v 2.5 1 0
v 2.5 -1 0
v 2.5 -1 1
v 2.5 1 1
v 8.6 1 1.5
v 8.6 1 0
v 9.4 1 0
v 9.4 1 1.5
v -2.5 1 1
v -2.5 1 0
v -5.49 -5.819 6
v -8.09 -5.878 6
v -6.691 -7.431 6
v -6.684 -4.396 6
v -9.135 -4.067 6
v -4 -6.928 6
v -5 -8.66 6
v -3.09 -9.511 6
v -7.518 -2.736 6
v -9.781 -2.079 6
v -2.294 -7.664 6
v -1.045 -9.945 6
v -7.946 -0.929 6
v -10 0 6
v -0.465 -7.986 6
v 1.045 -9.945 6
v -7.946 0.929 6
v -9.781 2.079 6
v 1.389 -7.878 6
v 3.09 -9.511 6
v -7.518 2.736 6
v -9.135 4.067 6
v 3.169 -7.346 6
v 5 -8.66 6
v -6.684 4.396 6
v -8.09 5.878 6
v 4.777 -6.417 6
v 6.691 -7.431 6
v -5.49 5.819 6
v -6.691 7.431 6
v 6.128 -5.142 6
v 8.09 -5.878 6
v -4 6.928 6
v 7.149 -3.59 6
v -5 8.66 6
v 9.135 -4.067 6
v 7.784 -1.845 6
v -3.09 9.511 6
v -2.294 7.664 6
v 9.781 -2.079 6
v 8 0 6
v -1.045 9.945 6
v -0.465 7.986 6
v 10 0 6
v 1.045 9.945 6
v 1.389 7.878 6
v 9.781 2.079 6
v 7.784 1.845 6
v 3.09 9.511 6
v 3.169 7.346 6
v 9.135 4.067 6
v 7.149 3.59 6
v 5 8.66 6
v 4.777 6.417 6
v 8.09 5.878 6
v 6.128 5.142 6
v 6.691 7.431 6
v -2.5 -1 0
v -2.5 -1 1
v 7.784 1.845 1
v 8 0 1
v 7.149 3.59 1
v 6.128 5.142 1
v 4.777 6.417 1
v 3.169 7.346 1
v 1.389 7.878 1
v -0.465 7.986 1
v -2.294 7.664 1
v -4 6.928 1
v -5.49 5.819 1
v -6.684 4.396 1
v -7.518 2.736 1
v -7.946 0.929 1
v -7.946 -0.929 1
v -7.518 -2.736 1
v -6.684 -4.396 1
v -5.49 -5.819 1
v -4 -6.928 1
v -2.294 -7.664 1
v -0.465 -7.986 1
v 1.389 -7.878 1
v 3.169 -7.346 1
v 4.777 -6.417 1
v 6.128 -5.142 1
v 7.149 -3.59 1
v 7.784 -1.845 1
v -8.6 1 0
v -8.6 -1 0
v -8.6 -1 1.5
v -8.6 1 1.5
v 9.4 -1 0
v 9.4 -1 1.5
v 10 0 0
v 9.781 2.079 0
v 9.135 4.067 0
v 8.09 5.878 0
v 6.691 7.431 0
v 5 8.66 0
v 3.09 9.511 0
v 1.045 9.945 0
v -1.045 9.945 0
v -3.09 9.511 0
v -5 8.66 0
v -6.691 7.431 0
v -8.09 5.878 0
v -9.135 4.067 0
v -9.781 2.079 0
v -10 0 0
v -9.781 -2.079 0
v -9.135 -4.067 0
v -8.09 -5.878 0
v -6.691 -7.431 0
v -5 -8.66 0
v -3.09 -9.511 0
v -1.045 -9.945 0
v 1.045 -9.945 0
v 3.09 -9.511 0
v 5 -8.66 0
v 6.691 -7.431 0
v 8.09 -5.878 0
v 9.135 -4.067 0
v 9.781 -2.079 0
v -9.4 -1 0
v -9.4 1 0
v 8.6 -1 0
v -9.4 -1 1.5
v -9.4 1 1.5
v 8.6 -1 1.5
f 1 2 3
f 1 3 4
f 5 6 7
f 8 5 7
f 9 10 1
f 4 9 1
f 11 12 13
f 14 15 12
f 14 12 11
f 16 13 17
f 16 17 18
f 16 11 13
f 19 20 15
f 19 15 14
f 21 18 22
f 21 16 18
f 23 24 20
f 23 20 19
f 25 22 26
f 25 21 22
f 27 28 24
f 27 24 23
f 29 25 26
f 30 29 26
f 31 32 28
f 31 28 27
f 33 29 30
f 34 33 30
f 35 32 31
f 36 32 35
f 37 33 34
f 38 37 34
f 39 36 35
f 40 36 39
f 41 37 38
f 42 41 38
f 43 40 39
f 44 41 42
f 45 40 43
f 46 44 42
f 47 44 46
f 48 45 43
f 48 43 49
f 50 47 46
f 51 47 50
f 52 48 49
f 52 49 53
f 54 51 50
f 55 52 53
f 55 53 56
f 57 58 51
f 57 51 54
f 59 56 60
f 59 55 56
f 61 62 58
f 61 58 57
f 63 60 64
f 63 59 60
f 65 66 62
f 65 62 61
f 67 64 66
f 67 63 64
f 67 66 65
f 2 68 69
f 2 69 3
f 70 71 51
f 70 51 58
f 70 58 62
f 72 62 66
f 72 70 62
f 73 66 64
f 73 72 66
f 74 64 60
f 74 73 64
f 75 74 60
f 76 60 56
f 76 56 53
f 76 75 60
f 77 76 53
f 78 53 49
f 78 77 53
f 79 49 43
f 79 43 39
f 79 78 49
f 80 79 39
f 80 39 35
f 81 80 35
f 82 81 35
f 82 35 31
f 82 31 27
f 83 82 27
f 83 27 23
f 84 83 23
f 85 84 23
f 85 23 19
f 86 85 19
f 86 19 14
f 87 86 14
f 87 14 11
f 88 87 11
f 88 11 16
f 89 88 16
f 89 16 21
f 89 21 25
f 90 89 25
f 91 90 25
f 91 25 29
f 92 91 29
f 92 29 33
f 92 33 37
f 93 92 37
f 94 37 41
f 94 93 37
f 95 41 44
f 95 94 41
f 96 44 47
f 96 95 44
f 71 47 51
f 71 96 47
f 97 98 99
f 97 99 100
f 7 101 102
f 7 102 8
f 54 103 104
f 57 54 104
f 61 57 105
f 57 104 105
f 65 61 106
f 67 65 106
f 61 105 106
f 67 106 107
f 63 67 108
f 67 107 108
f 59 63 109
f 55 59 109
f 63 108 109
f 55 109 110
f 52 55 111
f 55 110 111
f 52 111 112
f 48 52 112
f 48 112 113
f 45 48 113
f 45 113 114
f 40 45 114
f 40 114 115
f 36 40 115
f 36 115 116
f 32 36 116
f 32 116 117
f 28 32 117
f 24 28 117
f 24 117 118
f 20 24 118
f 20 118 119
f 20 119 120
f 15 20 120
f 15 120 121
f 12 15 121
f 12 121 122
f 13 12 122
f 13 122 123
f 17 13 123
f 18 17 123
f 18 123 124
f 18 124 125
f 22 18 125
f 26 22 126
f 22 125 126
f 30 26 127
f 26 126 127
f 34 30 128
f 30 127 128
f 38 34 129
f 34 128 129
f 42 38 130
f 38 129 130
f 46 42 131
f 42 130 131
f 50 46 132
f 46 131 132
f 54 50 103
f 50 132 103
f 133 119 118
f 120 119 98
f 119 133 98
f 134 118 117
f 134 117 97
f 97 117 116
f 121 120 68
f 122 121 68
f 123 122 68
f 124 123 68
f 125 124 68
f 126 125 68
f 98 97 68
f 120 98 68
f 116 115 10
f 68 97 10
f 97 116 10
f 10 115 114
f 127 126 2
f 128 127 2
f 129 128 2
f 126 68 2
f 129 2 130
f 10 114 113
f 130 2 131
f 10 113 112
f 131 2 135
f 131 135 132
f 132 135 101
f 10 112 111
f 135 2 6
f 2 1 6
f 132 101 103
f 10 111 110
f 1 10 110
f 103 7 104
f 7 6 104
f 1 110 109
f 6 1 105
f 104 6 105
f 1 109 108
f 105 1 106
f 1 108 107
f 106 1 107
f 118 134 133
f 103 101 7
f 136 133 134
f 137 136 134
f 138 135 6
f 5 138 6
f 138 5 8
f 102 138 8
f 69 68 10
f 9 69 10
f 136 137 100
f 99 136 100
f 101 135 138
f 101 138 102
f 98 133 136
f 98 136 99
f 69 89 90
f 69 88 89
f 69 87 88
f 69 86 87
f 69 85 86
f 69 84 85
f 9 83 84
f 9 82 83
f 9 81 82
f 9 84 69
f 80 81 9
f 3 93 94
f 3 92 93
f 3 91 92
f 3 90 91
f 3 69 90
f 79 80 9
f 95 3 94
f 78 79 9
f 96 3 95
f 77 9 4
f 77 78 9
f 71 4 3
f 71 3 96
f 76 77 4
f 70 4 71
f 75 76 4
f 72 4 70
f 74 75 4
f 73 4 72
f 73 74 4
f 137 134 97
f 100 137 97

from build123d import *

# Parameters (mm, degrees)
F0_R     = 10
F0_R_2   = 8
F1_DEPTH = 6
F2_R     = 10
F2_W     = 0.8
F2_H     = 2
F2_W_2   = 5
F3_DEPTH = 1
F4_DEPTH = 1.5


with BuildPart() as f1:
    # F0 (on Top) → F1 (new body)
    with BuildSketch(Plane.XY):
        Circle(F0_R)
        Circle(F0_R_2, mode=Mode.SUBTRACT)
    extrude(amount=F1_DEPTH)

    # F2 (on Top) → F3 (join)
    with BuildSketch(Plane.XY):
        Circle(F2_R)
        with Locations((-9, 0)):
            Rectangle(F2_W, F2_H, mode=Mode.SUBTRACT)
        Rectangle(F2_W_2, F2_H, mode=Mode.SUBTRACT)
        with Locations((9, 0)):
            Rectangle(F2_W, F2_H, mode=Mode.SUBTRACT)
    extrude(amount=F3_DEPTH)

    # F2 (on Top) → F4 (cut)
    with BuildSketch(Plane.XY):
        with Locations((9, 0)):
            Rectangle(F2_W, F2_H)
        with Locations((-9, 0)):
            Rectangle(F2_W, F2_H)
    extrude(amount=F4_DEPTH, mode=Mode.SUBTRACT)


solid = f1.part
